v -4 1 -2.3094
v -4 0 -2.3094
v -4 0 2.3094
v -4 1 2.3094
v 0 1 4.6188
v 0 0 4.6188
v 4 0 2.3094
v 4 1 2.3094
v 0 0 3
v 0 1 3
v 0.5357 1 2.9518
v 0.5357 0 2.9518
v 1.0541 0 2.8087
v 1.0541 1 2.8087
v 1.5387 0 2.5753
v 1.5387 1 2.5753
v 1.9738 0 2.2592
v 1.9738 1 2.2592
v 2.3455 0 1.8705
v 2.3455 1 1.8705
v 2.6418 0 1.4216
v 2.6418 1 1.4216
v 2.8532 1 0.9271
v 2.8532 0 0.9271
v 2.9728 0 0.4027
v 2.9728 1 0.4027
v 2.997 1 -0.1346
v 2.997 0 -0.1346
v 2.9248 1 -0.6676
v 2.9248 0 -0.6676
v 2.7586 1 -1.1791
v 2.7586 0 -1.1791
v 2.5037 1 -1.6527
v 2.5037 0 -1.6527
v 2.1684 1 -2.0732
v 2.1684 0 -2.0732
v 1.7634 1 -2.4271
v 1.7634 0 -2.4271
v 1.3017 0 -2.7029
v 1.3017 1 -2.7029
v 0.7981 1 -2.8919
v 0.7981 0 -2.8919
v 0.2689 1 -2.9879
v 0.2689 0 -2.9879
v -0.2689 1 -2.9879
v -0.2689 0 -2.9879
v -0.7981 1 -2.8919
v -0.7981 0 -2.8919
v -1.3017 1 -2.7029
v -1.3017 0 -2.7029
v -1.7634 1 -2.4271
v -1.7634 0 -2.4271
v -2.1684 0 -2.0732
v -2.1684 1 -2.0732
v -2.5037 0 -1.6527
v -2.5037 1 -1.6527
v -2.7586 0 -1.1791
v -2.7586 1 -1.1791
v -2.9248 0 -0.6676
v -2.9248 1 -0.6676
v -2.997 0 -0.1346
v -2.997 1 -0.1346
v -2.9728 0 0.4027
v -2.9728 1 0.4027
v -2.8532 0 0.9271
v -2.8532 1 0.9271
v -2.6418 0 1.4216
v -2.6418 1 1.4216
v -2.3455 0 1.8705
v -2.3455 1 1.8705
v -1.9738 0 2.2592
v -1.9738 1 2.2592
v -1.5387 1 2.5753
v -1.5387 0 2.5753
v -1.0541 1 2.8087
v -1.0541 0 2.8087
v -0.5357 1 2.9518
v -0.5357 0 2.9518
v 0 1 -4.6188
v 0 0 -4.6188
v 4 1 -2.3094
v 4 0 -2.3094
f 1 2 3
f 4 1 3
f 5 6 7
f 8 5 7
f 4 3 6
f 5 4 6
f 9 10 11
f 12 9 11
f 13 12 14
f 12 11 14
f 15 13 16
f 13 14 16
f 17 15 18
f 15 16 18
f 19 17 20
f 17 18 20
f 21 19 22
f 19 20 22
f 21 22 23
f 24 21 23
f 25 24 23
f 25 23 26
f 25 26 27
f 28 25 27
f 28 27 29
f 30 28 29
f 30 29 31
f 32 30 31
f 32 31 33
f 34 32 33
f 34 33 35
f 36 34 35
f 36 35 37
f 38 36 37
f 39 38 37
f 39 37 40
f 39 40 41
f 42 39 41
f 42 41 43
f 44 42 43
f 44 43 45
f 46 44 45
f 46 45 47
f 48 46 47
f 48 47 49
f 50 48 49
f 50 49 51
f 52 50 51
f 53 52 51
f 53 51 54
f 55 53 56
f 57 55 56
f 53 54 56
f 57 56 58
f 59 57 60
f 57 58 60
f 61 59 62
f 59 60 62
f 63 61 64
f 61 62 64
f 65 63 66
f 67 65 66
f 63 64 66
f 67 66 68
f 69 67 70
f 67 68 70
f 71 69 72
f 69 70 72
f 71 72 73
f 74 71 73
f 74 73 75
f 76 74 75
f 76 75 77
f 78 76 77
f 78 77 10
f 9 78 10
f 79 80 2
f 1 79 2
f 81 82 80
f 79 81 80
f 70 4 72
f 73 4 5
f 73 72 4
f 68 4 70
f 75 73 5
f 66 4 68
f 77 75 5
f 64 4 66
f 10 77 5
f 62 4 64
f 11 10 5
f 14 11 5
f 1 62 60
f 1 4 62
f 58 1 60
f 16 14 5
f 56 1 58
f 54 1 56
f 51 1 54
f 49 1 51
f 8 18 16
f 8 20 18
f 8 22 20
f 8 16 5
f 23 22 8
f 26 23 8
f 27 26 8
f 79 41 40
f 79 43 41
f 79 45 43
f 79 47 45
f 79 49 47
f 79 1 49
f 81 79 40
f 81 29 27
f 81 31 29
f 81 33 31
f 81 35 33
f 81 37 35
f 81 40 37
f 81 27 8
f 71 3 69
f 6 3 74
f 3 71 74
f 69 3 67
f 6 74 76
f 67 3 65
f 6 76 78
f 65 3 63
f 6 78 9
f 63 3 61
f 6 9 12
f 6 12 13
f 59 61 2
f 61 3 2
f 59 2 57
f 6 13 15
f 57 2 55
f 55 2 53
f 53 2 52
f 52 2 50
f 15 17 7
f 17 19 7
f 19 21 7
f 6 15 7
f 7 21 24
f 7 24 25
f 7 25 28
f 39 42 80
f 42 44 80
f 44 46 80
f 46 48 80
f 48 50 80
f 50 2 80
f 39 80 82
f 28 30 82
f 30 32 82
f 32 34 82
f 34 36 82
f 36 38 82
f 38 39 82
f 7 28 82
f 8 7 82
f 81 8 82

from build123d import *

# Parameters (mm, degrees)
BOSS_EXTRUDE2_DEPTH = 1
CUT_EXTRUDE2_REACH  = 8.191
SKETCH4_R           = 3


with BuildPart() as part:
    # Sketch2 → Boss-Extrude2 (new body)
    with BuildSketch(Plane(origin=(0, 0, 0), x_dir=(1, 0, 0), z_dir=(0, 1, 0))):
        Polygon((0, 4.618802154), (-4, 2.309401077), (-4, -2.309401077), (0, -4.618802154), (4, -2.309401077), (4, 2.309401077), align=None)
    extrude(amount=BOSS_EXTRUDE2_DEPTH)

    # Sketch4 → Cut-Extrude2 (cut, up to next)
    with BuildSketch(Plane(origin=(0, 1, 0), x_dir=(1, 0, 0), z_dir=(0, 1, 0)), mode=Mode.PRIVATE) as cut_extrude2_sk1:
        with Locations(Location((0, 0, 0), (0, 0, 270))):
            Circle(SKETCH4_R)
    cut_extrude2_tool1 = extrude(cut_extrude2_sk1.sketch, amount=-CUT_EXTRUDE2_REACH, mode=Mode.PRIVATE) & part.part
    add(cut_extrude2_tool1.solids().sort_by_distance((0, 1, 0))[0], mode=Mode.SUBTRACT)


solid = part.part
